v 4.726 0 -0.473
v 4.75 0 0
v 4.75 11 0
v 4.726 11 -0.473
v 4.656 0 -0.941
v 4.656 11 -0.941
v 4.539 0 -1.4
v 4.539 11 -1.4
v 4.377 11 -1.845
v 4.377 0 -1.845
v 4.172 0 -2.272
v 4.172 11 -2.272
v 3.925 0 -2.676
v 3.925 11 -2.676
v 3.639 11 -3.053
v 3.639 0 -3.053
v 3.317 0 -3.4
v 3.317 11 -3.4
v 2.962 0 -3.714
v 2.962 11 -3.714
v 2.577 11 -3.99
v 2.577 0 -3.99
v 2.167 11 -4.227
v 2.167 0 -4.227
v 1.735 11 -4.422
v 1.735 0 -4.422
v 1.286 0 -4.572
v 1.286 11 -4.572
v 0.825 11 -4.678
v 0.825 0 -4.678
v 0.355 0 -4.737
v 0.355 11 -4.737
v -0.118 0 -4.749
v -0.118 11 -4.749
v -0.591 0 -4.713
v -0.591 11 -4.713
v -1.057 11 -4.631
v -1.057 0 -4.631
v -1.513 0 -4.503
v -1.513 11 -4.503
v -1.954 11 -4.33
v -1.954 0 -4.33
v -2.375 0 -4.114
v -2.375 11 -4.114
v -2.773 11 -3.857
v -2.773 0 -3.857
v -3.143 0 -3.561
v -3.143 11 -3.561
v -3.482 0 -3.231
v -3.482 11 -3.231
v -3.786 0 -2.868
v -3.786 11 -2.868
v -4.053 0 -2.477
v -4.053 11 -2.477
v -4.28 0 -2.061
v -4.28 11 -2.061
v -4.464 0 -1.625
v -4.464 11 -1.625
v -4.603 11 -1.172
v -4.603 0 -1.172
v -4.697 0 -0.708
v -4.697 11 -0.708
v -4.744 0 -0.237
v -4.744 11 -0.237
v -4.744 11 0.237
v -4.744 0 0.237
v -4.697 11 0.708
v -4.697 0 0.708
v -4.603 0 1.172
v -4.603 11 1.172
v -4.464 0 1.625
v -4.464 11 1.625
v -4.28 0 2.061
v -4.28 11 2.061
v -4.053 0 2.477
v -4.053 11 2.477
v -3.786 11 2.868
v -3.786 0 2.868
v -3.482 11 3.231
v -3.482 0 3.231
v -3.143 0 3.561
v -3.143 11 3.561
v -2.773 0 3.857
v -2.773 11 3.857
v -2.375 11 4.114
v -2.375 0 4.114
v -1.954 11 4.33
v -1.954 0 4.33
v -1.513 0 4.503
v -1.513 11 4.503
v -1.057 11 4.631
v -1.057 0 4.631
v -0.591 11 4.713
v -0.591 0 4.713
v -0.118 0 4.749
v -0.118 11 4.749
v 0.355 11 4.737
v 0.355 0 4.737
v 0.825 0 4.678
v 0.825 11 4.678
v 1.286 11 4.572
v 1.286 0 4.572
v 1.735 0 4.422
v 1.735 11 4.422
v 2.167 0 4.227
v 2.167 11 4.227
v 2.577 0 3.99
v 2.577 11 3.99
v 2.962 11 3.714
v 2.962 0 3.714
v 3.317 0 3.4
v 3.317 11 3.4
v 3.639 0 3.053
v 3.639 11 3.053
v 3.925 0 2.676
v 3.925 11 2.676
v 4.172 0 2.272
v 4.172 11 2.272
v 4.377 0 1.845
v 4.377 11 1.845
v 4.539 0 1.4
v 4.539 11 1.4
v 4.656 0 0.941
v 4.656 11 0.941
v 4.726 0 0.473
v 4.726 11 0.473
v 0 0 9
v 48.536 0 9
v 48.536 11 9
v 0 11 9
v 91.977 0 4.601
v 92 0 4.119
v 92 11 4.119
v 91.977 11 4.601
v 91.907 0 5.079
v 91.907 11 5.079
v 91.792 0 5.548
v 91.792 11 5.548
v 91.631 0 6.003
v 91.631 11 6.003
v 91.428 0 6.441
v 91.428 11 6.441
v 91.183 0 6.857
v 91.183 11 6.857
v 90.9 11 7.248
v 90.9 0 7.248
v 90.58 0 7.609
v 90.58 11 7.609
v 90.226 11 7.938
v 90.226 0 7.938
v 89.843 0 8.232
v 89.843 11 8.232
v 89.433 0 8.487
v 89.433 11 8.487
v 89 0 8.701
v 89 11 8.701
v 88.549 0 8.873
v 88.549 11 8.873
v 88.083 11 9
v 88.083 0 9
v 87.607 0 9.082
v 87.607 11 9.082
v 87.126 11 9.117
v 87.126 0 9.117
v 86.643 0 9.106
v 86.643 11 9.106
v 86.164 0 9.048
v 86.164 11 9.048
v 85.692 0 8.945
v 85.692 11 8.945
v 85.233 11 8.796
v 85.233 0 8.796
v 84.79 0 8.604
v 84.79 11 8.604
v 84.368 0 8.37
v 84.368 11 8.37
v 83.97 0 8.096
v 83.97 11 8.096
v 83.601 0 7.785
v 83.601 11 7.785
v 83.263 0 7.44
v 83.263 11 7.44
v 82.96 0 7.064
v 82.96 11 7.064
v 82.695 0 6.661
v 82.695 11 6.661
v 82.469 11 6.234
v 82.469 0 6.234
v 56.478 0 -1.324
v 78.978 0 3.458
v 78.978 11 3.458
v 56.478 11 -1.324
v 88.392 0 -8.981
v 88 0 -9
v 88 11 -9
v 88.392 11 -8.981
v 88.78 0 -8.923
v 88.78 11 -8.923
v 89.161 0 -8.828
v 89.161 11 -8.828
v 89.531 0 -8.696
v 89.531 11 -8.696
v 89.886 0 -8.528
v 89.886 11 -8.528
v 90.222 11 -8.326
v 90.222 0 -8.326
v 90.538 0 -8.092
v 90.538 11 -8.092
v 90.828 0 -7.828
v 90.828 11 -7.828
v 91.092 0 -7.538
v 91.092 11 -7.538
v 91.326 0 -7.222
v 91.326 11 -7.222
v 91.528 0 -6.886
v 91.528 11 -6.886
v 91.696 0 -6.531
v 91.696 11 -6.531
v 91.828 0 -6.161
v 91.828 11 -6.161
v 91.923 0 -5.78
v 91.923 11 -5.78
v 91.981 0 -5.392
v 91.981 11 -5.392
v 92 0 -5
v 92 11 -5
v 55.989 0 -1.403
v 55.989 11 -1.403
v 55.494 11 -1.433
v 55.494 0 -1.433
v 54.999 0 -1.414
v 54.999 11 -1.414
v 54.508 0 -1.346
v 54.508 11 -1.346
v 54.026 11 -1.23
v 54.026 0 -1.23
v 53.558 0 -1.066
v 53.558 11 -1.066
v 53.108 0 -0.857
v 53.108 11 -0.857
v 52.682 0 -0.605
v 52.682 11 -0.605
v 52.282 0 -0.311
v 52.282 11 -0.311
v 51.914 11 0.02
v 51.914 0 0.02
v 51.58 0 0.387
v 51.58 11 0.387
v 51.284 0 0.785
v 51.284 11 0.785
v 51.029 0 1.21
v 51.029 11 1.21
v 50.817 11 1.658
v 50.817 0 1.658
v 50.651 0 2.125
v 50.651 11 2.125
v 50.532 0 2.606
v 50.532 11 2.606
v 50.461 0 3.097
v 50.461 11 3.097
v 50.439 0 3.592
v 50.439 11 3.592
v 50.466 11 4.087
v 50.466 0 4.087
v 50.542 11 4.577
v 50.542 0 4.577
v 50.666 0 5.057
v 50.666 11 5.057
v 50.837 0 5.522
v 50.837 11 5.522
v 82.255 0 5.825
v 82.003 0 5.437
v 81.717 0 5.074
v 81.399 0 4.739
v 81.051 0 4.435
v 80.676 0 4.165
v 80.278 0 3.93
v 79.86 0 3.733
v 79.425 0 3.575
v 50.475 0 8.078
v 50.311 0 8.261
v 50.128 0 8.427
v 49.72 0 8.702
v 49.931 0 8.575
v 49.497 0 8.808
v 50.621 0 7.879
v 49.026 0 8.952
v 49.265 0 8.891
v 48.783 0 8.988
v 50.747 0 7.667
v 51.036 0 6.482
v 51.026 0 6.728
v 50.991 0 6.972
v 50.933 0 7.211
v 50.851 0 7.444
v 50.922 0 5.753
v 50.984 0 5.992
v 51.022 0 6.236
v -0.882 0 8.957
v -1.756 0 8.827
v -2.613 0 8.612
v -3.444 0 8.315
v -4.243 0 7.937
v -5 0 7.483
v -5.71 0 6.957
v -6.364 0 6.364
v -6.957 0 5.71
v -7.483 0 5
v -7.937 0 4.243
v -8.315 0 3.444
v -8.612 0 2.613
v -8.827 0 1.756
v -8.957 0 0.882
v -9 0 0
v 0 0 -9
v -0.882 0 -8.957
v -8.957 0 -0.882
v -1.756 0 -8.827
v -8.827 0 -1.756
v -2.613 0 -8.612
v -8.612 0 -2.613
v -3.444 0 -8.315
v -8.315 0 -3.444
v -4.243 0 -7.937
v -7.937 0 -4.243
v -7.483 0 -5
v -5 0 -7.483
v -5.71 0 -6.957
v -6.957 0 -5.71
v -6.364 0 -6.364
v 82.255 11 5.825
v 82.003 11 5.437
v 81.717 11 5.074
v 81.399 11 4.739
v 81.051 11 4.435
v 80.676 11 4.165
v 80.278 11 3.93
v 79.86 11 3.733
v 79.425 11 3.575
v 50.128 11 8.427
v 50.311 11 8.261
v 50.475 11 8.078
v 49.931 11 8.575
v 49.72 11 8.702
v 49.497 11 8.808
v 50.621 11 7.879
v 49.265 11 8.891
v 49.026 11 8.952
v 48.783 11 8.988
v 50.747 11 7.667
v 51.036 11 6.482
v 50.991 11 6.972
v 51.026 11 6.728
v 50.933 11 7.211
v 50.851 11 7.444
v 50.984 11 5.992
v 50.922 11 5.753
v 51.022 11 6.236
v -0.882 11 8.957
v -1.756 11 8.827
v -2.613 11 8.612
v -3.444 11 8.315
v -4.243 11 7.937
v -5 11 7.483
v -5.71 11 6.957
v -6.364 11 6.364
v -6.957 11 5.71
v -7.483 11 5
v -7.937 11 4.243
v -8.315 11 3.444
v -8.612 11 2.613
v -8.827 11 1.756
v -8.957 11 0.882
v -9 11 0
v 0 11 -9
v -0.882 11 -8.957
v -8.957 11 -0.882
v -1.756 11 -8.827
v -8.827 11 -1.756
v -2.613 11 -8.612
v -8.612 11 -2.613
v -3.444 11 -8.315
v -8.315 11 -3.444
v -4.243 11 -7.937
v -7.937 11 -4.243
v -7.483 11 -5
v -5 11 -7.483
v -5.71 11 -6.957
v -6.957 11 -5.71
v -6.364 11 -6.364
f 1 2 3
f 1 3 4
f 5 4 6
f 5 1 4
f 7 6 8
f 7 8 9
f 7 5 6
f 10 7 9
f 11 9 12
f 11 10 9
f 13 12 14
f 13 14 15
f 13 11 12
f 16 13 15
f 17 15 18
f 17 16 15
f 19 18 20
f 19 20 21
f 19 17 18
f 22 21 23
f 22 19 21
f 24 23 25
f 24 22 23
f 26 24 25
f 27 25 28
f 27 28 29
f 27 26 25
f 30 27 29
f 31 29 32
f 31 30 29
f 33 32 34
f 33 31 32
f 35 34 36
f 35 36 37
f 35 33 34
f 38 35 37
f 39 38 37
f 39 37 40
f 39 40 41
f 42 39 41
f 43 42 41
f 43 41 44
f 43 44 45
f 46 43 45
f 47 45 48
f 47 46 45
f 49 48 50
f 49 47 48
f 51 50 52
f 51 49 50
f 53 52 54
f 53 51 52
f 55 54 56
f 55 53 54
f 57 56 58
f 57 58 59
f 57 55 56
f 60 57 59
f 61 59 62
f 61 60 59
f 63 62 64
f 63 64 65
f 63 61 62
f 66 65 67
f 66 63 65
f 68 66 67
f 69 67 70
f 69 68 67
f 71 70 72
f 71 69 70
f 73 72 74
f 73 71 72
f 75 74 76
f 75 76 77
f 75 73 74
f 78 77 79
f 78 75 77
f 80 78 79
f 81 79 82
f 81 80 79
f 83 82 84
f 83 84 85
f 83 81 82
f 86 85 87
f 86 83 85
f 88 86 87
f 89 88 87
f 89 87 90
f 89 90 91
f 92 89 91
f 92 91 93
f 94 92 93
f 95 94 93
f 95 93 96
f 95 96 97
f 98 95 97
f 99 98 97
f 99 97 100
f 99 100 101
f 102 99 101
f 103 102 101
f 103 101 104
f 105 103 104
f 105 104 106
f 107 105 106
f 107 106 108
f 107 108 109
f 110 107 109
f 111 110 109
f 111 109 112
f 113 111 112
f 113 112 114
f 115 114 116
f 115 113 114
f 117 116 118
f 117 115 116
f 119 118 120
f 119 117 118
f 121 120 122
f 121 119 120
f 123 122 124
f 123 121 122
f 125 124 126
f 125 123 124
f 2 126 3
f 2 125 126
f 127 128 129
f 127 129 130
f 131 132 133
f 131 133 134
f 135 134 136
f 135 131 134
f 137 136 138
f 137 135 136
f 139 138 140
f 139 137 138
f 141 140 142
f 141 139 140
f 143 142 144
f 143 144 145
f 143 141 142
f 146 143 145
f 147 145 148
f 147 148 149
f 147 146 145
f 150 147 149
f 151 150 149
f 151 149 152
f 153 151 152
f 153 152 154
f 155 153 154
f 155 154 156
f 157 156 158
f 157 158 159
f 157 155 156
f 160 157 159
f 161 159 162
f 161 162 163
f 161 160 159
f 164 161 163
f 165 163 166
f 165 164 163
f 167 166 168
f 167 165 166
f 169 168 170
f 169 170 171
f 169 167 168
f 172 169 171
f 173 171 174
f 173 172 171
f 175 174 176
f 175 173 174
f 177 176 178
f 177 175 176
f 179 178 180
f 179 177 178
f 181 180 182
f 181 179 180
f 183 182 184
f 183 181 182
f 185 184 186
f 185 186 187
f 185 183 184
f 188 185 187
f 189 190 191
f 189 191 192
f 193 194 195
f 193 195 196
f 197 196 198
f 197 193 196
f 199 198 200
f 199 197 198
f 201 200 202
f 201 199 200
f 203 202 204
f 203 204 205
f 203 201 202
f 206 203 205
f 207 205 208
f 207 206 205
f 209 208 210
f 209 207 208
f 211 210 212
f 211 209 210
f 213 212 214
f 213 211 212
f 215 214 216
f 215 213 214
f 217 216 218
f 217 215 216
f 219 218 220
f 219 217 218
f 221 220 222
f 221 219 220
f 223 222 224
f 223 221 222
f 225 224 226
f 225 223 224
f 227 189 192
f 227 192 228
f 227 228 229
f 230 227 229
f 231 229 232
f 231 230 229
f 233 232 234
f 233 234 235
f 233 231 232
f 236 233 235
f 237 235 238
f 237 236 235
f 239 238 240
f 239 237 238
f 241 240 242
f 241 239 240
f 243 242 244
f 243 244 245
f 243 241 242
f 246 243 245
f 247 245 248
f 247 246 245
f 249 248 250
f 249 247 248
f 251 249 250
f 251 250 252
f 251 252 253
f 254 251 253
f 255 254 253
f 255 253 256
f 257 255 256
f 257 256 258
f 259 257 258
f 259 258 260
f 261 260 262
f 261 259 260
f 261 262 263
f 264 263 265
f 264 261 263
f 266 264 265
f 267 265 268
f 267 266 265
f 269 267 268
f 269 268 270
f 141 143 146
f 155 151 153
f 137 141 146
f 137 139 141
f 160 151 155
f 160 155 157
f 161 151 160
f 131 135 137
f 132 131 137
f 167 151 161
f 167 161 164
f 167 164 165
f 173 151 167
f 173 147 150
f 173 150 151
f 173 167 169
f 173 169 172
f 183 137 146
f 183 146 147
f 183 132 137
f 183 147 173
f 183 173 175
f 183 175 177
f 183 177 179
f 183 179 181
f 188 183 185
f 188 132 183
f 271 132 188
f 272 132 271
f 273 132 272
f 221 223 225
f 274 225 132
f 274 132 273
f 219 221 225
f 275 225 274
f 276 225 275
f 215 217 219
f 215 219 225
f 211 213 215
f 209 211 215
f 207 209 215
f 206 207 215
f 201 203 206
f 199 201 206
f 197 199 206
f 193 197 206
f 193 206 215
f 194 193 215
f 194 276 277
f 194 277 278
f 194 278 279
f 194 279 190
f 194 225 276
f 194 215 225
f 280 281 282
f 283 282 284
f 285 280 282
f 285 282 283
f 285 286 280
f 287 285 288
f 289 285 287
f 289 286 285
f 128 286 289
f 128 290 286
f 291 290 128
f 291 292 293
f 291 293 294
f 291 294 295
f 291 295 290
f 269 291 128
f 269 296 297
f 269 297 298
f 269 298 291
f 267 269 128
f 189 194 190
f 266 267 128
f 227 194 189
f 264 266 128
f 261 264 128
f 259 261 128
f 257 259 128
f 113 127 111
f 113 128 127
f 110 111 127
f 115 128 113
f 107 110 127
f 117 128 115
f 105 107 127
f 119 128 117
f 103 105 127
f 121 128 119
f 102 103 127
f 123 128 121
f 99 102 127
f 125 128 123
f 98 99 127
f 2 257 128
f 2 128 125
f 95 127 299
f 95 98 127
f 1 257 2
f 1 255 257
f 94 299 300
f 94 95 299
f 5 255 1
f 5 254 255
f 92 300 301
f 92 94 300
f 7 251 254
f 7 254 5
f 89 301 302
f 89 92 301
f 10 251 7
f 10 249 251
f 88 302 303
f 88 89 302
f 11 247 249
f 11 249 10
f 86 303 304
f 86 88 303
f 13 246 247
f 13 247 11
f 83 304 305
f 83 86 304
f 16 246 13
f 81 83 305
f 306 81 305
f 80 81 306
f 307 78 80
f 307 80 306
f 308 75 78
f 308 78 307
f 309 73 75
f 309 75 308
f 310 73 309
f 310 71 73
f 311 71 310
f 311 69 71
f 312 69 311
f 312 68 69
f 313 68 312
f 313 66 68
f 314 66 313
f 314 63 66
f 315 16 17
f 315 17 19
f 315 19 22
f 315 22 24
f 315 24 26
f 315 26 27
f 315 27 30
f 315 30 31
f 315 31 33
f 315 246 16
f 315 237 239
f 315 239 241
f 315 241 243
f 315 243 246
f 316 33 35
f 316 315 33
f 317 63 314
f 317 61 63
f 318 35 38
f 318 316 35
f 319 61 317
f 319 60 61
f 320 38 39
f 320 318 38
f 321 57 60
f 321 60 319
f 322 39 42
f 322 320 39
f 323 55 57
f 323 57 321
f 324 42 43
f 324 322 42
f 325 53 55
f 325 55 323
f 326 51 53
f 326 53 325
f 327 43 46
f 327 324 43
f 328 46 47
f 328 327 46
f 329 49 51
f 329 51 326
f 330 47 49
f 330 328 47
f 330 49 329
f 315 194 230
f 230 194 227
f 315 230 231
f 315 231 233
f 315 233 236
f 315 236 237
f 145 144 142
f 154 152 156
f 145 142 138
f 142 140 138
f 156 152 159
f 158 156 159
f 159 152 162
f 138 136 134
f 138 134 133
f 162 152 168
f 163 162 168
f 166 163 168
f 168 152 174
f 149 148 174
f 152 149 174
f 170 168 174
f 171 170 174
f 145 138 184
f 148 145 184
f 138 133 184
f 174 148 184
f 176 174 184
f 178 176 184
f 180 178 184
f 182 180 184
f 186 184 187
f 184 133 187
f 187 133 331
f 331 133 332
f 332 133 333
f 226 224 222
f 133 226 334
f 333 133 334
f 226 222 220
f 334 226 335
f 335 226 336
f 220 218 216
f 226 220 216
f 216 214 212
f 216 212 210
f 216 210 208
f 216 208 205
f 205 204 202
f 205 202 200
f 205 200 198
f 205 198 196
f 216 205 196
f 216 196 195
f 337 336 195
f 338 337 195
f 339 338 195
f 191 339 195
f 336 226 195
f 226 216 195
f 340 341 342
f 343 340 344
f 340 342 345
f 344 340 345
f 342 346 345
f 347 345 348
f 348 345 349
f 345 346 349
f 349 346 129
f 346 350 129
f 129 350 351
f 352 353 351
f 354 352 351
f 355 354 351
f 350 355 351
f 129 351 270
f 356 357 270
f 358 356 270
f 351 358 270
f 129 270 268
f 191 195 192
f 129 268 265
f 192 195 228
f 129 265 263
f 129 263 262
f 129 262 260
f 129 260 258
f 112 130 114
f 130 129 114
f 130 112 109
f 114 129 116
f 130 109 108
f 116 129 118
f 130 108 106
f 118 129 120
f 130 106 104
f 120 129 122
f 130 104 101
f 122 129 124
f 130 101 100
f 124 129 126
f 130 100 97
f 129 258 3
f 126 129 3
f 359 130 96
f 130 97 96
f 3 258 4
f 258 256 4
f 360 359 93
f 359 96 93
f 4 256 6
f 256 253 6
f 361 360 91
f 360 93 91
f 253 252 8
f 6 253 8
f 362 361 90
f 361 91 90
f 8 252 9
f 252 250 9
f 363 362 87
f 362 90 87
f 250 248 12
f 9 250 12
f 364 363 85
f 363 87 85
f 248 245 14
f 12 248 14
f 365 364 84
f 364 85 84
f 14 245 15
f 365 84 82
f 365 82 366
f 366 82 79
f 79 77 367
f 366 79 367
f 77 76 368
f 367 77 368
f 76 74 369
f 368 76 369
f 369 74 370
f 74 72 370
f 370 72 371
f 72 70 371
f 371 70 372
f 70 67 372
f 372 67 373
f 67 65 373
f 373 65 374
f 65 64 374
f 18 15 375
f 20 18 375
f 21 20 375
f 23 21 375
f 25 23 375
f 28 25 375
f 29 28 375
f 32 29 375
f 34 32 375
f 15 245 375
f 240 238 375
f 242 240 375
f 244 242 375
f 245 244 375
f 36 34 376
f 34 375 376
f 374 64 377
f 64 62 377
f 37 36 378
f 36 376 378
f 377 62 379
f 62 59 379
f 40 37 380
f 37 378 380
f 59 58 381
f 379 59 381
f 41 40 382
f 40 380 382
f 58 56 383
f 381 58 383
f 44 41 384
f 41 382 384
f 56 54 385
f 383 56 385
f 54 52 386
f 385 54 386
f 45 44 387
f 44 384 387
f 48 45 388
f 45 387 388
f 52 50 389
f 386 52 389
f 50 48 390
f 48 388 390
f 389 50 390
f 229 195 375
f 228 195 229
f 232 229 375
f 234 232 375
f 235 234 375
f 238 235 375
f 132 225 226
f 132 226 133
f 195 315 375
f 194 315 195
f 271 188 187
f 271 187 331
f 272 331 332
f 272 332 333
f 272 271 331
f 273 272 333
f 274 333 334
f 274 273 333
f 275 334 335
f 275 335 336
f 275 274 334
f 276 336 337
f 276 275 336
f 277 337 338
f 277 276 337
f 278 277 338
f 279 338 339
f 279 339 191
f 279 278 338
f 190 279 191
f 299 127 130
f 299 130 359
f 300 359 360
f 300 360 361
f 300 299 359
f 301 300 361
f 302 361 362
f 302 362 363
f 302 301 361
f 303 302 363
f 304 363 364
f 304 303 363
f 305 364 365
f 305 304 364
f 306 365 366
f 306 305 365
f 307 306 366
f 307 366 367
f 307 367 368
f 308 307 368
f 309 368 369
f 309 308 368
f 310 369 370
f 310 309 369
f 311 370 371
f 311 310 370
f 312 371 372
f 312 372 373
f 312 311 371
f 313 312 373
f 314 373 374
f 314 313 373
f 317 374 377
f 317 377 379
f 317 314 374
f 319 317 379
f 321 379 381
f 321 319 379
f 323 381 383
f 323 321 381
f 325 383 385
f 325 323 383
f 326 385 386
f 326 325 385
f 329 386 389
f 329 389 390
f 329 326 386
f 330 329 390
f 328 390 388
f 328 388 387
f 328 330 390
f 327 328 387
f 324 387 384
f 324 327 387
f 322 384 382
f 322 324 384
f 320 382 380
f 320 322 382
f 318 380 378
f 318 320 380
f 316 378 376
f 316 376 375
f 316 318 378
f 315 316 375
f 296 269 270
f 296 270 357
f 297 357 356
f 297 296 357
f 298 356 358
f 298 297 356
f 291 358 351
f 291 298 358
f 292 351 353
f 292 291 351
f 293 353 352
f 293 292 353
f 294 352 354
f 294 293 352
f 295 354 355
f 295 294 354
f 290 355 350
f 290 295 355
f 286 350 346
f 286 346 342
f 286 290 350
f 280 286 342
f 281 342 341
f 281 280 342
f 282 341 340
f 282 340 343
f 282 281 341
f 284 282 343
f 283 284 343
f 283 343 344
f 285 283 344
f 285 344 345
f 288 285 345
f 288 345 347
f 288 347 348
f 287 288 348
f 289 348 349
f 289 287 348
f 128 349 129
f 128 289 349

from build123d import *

# Parameters (mm, degrees)
SKETCH1_R           = 4.75
BOSS_EXTRUDE1_DEPTH = 11


with BuildPart() as part:
    # Sketch1 → Boss-Extrude1 (new body)
    with BuildSketch(Plane(origin=(0, 0, 0), x_dir=(1, 0, 0), z_dir=(0, 1, 0))):
        with BuildLine():
            Line((0, 9), (88, 9))
            ThreePointArc((88, 9), (90.828427125, 7.828427125), (92, 5))
            Line((92, 5), (92, -4.118760913))
            ThreePointArc((92, -4.118760913), (88.083284346, -9), (82.46940199, -6.233868869))
            ThreePointArc((82.46940199, -6.233868869), (81.050506295, -4.43524348), (78.978362433, -3.458238822))
            Line((78.978362433, -3.458238822), (56.478362433, 1.324283815))
            ThreePointArc((56.478362433, 1.324283815), (51.57997572, -0.38691893), (50.837146839, -5.522151396))
            ThreePointArc((50.837146839, -5.522151396), (50.621338834, -7.879380022), (48.53631827, -9))
            Line((48.53631827, -9), (0, -9))
            ThreePointArc((0, -9), (-9, 0), (0, 9))
        make_face()
        Circle(SKETCH1_R, mode=Mode.SUBTRACT)
    extrude(amount=BOSS_EXTRUDE1_DEPTH)


solid = part.part
